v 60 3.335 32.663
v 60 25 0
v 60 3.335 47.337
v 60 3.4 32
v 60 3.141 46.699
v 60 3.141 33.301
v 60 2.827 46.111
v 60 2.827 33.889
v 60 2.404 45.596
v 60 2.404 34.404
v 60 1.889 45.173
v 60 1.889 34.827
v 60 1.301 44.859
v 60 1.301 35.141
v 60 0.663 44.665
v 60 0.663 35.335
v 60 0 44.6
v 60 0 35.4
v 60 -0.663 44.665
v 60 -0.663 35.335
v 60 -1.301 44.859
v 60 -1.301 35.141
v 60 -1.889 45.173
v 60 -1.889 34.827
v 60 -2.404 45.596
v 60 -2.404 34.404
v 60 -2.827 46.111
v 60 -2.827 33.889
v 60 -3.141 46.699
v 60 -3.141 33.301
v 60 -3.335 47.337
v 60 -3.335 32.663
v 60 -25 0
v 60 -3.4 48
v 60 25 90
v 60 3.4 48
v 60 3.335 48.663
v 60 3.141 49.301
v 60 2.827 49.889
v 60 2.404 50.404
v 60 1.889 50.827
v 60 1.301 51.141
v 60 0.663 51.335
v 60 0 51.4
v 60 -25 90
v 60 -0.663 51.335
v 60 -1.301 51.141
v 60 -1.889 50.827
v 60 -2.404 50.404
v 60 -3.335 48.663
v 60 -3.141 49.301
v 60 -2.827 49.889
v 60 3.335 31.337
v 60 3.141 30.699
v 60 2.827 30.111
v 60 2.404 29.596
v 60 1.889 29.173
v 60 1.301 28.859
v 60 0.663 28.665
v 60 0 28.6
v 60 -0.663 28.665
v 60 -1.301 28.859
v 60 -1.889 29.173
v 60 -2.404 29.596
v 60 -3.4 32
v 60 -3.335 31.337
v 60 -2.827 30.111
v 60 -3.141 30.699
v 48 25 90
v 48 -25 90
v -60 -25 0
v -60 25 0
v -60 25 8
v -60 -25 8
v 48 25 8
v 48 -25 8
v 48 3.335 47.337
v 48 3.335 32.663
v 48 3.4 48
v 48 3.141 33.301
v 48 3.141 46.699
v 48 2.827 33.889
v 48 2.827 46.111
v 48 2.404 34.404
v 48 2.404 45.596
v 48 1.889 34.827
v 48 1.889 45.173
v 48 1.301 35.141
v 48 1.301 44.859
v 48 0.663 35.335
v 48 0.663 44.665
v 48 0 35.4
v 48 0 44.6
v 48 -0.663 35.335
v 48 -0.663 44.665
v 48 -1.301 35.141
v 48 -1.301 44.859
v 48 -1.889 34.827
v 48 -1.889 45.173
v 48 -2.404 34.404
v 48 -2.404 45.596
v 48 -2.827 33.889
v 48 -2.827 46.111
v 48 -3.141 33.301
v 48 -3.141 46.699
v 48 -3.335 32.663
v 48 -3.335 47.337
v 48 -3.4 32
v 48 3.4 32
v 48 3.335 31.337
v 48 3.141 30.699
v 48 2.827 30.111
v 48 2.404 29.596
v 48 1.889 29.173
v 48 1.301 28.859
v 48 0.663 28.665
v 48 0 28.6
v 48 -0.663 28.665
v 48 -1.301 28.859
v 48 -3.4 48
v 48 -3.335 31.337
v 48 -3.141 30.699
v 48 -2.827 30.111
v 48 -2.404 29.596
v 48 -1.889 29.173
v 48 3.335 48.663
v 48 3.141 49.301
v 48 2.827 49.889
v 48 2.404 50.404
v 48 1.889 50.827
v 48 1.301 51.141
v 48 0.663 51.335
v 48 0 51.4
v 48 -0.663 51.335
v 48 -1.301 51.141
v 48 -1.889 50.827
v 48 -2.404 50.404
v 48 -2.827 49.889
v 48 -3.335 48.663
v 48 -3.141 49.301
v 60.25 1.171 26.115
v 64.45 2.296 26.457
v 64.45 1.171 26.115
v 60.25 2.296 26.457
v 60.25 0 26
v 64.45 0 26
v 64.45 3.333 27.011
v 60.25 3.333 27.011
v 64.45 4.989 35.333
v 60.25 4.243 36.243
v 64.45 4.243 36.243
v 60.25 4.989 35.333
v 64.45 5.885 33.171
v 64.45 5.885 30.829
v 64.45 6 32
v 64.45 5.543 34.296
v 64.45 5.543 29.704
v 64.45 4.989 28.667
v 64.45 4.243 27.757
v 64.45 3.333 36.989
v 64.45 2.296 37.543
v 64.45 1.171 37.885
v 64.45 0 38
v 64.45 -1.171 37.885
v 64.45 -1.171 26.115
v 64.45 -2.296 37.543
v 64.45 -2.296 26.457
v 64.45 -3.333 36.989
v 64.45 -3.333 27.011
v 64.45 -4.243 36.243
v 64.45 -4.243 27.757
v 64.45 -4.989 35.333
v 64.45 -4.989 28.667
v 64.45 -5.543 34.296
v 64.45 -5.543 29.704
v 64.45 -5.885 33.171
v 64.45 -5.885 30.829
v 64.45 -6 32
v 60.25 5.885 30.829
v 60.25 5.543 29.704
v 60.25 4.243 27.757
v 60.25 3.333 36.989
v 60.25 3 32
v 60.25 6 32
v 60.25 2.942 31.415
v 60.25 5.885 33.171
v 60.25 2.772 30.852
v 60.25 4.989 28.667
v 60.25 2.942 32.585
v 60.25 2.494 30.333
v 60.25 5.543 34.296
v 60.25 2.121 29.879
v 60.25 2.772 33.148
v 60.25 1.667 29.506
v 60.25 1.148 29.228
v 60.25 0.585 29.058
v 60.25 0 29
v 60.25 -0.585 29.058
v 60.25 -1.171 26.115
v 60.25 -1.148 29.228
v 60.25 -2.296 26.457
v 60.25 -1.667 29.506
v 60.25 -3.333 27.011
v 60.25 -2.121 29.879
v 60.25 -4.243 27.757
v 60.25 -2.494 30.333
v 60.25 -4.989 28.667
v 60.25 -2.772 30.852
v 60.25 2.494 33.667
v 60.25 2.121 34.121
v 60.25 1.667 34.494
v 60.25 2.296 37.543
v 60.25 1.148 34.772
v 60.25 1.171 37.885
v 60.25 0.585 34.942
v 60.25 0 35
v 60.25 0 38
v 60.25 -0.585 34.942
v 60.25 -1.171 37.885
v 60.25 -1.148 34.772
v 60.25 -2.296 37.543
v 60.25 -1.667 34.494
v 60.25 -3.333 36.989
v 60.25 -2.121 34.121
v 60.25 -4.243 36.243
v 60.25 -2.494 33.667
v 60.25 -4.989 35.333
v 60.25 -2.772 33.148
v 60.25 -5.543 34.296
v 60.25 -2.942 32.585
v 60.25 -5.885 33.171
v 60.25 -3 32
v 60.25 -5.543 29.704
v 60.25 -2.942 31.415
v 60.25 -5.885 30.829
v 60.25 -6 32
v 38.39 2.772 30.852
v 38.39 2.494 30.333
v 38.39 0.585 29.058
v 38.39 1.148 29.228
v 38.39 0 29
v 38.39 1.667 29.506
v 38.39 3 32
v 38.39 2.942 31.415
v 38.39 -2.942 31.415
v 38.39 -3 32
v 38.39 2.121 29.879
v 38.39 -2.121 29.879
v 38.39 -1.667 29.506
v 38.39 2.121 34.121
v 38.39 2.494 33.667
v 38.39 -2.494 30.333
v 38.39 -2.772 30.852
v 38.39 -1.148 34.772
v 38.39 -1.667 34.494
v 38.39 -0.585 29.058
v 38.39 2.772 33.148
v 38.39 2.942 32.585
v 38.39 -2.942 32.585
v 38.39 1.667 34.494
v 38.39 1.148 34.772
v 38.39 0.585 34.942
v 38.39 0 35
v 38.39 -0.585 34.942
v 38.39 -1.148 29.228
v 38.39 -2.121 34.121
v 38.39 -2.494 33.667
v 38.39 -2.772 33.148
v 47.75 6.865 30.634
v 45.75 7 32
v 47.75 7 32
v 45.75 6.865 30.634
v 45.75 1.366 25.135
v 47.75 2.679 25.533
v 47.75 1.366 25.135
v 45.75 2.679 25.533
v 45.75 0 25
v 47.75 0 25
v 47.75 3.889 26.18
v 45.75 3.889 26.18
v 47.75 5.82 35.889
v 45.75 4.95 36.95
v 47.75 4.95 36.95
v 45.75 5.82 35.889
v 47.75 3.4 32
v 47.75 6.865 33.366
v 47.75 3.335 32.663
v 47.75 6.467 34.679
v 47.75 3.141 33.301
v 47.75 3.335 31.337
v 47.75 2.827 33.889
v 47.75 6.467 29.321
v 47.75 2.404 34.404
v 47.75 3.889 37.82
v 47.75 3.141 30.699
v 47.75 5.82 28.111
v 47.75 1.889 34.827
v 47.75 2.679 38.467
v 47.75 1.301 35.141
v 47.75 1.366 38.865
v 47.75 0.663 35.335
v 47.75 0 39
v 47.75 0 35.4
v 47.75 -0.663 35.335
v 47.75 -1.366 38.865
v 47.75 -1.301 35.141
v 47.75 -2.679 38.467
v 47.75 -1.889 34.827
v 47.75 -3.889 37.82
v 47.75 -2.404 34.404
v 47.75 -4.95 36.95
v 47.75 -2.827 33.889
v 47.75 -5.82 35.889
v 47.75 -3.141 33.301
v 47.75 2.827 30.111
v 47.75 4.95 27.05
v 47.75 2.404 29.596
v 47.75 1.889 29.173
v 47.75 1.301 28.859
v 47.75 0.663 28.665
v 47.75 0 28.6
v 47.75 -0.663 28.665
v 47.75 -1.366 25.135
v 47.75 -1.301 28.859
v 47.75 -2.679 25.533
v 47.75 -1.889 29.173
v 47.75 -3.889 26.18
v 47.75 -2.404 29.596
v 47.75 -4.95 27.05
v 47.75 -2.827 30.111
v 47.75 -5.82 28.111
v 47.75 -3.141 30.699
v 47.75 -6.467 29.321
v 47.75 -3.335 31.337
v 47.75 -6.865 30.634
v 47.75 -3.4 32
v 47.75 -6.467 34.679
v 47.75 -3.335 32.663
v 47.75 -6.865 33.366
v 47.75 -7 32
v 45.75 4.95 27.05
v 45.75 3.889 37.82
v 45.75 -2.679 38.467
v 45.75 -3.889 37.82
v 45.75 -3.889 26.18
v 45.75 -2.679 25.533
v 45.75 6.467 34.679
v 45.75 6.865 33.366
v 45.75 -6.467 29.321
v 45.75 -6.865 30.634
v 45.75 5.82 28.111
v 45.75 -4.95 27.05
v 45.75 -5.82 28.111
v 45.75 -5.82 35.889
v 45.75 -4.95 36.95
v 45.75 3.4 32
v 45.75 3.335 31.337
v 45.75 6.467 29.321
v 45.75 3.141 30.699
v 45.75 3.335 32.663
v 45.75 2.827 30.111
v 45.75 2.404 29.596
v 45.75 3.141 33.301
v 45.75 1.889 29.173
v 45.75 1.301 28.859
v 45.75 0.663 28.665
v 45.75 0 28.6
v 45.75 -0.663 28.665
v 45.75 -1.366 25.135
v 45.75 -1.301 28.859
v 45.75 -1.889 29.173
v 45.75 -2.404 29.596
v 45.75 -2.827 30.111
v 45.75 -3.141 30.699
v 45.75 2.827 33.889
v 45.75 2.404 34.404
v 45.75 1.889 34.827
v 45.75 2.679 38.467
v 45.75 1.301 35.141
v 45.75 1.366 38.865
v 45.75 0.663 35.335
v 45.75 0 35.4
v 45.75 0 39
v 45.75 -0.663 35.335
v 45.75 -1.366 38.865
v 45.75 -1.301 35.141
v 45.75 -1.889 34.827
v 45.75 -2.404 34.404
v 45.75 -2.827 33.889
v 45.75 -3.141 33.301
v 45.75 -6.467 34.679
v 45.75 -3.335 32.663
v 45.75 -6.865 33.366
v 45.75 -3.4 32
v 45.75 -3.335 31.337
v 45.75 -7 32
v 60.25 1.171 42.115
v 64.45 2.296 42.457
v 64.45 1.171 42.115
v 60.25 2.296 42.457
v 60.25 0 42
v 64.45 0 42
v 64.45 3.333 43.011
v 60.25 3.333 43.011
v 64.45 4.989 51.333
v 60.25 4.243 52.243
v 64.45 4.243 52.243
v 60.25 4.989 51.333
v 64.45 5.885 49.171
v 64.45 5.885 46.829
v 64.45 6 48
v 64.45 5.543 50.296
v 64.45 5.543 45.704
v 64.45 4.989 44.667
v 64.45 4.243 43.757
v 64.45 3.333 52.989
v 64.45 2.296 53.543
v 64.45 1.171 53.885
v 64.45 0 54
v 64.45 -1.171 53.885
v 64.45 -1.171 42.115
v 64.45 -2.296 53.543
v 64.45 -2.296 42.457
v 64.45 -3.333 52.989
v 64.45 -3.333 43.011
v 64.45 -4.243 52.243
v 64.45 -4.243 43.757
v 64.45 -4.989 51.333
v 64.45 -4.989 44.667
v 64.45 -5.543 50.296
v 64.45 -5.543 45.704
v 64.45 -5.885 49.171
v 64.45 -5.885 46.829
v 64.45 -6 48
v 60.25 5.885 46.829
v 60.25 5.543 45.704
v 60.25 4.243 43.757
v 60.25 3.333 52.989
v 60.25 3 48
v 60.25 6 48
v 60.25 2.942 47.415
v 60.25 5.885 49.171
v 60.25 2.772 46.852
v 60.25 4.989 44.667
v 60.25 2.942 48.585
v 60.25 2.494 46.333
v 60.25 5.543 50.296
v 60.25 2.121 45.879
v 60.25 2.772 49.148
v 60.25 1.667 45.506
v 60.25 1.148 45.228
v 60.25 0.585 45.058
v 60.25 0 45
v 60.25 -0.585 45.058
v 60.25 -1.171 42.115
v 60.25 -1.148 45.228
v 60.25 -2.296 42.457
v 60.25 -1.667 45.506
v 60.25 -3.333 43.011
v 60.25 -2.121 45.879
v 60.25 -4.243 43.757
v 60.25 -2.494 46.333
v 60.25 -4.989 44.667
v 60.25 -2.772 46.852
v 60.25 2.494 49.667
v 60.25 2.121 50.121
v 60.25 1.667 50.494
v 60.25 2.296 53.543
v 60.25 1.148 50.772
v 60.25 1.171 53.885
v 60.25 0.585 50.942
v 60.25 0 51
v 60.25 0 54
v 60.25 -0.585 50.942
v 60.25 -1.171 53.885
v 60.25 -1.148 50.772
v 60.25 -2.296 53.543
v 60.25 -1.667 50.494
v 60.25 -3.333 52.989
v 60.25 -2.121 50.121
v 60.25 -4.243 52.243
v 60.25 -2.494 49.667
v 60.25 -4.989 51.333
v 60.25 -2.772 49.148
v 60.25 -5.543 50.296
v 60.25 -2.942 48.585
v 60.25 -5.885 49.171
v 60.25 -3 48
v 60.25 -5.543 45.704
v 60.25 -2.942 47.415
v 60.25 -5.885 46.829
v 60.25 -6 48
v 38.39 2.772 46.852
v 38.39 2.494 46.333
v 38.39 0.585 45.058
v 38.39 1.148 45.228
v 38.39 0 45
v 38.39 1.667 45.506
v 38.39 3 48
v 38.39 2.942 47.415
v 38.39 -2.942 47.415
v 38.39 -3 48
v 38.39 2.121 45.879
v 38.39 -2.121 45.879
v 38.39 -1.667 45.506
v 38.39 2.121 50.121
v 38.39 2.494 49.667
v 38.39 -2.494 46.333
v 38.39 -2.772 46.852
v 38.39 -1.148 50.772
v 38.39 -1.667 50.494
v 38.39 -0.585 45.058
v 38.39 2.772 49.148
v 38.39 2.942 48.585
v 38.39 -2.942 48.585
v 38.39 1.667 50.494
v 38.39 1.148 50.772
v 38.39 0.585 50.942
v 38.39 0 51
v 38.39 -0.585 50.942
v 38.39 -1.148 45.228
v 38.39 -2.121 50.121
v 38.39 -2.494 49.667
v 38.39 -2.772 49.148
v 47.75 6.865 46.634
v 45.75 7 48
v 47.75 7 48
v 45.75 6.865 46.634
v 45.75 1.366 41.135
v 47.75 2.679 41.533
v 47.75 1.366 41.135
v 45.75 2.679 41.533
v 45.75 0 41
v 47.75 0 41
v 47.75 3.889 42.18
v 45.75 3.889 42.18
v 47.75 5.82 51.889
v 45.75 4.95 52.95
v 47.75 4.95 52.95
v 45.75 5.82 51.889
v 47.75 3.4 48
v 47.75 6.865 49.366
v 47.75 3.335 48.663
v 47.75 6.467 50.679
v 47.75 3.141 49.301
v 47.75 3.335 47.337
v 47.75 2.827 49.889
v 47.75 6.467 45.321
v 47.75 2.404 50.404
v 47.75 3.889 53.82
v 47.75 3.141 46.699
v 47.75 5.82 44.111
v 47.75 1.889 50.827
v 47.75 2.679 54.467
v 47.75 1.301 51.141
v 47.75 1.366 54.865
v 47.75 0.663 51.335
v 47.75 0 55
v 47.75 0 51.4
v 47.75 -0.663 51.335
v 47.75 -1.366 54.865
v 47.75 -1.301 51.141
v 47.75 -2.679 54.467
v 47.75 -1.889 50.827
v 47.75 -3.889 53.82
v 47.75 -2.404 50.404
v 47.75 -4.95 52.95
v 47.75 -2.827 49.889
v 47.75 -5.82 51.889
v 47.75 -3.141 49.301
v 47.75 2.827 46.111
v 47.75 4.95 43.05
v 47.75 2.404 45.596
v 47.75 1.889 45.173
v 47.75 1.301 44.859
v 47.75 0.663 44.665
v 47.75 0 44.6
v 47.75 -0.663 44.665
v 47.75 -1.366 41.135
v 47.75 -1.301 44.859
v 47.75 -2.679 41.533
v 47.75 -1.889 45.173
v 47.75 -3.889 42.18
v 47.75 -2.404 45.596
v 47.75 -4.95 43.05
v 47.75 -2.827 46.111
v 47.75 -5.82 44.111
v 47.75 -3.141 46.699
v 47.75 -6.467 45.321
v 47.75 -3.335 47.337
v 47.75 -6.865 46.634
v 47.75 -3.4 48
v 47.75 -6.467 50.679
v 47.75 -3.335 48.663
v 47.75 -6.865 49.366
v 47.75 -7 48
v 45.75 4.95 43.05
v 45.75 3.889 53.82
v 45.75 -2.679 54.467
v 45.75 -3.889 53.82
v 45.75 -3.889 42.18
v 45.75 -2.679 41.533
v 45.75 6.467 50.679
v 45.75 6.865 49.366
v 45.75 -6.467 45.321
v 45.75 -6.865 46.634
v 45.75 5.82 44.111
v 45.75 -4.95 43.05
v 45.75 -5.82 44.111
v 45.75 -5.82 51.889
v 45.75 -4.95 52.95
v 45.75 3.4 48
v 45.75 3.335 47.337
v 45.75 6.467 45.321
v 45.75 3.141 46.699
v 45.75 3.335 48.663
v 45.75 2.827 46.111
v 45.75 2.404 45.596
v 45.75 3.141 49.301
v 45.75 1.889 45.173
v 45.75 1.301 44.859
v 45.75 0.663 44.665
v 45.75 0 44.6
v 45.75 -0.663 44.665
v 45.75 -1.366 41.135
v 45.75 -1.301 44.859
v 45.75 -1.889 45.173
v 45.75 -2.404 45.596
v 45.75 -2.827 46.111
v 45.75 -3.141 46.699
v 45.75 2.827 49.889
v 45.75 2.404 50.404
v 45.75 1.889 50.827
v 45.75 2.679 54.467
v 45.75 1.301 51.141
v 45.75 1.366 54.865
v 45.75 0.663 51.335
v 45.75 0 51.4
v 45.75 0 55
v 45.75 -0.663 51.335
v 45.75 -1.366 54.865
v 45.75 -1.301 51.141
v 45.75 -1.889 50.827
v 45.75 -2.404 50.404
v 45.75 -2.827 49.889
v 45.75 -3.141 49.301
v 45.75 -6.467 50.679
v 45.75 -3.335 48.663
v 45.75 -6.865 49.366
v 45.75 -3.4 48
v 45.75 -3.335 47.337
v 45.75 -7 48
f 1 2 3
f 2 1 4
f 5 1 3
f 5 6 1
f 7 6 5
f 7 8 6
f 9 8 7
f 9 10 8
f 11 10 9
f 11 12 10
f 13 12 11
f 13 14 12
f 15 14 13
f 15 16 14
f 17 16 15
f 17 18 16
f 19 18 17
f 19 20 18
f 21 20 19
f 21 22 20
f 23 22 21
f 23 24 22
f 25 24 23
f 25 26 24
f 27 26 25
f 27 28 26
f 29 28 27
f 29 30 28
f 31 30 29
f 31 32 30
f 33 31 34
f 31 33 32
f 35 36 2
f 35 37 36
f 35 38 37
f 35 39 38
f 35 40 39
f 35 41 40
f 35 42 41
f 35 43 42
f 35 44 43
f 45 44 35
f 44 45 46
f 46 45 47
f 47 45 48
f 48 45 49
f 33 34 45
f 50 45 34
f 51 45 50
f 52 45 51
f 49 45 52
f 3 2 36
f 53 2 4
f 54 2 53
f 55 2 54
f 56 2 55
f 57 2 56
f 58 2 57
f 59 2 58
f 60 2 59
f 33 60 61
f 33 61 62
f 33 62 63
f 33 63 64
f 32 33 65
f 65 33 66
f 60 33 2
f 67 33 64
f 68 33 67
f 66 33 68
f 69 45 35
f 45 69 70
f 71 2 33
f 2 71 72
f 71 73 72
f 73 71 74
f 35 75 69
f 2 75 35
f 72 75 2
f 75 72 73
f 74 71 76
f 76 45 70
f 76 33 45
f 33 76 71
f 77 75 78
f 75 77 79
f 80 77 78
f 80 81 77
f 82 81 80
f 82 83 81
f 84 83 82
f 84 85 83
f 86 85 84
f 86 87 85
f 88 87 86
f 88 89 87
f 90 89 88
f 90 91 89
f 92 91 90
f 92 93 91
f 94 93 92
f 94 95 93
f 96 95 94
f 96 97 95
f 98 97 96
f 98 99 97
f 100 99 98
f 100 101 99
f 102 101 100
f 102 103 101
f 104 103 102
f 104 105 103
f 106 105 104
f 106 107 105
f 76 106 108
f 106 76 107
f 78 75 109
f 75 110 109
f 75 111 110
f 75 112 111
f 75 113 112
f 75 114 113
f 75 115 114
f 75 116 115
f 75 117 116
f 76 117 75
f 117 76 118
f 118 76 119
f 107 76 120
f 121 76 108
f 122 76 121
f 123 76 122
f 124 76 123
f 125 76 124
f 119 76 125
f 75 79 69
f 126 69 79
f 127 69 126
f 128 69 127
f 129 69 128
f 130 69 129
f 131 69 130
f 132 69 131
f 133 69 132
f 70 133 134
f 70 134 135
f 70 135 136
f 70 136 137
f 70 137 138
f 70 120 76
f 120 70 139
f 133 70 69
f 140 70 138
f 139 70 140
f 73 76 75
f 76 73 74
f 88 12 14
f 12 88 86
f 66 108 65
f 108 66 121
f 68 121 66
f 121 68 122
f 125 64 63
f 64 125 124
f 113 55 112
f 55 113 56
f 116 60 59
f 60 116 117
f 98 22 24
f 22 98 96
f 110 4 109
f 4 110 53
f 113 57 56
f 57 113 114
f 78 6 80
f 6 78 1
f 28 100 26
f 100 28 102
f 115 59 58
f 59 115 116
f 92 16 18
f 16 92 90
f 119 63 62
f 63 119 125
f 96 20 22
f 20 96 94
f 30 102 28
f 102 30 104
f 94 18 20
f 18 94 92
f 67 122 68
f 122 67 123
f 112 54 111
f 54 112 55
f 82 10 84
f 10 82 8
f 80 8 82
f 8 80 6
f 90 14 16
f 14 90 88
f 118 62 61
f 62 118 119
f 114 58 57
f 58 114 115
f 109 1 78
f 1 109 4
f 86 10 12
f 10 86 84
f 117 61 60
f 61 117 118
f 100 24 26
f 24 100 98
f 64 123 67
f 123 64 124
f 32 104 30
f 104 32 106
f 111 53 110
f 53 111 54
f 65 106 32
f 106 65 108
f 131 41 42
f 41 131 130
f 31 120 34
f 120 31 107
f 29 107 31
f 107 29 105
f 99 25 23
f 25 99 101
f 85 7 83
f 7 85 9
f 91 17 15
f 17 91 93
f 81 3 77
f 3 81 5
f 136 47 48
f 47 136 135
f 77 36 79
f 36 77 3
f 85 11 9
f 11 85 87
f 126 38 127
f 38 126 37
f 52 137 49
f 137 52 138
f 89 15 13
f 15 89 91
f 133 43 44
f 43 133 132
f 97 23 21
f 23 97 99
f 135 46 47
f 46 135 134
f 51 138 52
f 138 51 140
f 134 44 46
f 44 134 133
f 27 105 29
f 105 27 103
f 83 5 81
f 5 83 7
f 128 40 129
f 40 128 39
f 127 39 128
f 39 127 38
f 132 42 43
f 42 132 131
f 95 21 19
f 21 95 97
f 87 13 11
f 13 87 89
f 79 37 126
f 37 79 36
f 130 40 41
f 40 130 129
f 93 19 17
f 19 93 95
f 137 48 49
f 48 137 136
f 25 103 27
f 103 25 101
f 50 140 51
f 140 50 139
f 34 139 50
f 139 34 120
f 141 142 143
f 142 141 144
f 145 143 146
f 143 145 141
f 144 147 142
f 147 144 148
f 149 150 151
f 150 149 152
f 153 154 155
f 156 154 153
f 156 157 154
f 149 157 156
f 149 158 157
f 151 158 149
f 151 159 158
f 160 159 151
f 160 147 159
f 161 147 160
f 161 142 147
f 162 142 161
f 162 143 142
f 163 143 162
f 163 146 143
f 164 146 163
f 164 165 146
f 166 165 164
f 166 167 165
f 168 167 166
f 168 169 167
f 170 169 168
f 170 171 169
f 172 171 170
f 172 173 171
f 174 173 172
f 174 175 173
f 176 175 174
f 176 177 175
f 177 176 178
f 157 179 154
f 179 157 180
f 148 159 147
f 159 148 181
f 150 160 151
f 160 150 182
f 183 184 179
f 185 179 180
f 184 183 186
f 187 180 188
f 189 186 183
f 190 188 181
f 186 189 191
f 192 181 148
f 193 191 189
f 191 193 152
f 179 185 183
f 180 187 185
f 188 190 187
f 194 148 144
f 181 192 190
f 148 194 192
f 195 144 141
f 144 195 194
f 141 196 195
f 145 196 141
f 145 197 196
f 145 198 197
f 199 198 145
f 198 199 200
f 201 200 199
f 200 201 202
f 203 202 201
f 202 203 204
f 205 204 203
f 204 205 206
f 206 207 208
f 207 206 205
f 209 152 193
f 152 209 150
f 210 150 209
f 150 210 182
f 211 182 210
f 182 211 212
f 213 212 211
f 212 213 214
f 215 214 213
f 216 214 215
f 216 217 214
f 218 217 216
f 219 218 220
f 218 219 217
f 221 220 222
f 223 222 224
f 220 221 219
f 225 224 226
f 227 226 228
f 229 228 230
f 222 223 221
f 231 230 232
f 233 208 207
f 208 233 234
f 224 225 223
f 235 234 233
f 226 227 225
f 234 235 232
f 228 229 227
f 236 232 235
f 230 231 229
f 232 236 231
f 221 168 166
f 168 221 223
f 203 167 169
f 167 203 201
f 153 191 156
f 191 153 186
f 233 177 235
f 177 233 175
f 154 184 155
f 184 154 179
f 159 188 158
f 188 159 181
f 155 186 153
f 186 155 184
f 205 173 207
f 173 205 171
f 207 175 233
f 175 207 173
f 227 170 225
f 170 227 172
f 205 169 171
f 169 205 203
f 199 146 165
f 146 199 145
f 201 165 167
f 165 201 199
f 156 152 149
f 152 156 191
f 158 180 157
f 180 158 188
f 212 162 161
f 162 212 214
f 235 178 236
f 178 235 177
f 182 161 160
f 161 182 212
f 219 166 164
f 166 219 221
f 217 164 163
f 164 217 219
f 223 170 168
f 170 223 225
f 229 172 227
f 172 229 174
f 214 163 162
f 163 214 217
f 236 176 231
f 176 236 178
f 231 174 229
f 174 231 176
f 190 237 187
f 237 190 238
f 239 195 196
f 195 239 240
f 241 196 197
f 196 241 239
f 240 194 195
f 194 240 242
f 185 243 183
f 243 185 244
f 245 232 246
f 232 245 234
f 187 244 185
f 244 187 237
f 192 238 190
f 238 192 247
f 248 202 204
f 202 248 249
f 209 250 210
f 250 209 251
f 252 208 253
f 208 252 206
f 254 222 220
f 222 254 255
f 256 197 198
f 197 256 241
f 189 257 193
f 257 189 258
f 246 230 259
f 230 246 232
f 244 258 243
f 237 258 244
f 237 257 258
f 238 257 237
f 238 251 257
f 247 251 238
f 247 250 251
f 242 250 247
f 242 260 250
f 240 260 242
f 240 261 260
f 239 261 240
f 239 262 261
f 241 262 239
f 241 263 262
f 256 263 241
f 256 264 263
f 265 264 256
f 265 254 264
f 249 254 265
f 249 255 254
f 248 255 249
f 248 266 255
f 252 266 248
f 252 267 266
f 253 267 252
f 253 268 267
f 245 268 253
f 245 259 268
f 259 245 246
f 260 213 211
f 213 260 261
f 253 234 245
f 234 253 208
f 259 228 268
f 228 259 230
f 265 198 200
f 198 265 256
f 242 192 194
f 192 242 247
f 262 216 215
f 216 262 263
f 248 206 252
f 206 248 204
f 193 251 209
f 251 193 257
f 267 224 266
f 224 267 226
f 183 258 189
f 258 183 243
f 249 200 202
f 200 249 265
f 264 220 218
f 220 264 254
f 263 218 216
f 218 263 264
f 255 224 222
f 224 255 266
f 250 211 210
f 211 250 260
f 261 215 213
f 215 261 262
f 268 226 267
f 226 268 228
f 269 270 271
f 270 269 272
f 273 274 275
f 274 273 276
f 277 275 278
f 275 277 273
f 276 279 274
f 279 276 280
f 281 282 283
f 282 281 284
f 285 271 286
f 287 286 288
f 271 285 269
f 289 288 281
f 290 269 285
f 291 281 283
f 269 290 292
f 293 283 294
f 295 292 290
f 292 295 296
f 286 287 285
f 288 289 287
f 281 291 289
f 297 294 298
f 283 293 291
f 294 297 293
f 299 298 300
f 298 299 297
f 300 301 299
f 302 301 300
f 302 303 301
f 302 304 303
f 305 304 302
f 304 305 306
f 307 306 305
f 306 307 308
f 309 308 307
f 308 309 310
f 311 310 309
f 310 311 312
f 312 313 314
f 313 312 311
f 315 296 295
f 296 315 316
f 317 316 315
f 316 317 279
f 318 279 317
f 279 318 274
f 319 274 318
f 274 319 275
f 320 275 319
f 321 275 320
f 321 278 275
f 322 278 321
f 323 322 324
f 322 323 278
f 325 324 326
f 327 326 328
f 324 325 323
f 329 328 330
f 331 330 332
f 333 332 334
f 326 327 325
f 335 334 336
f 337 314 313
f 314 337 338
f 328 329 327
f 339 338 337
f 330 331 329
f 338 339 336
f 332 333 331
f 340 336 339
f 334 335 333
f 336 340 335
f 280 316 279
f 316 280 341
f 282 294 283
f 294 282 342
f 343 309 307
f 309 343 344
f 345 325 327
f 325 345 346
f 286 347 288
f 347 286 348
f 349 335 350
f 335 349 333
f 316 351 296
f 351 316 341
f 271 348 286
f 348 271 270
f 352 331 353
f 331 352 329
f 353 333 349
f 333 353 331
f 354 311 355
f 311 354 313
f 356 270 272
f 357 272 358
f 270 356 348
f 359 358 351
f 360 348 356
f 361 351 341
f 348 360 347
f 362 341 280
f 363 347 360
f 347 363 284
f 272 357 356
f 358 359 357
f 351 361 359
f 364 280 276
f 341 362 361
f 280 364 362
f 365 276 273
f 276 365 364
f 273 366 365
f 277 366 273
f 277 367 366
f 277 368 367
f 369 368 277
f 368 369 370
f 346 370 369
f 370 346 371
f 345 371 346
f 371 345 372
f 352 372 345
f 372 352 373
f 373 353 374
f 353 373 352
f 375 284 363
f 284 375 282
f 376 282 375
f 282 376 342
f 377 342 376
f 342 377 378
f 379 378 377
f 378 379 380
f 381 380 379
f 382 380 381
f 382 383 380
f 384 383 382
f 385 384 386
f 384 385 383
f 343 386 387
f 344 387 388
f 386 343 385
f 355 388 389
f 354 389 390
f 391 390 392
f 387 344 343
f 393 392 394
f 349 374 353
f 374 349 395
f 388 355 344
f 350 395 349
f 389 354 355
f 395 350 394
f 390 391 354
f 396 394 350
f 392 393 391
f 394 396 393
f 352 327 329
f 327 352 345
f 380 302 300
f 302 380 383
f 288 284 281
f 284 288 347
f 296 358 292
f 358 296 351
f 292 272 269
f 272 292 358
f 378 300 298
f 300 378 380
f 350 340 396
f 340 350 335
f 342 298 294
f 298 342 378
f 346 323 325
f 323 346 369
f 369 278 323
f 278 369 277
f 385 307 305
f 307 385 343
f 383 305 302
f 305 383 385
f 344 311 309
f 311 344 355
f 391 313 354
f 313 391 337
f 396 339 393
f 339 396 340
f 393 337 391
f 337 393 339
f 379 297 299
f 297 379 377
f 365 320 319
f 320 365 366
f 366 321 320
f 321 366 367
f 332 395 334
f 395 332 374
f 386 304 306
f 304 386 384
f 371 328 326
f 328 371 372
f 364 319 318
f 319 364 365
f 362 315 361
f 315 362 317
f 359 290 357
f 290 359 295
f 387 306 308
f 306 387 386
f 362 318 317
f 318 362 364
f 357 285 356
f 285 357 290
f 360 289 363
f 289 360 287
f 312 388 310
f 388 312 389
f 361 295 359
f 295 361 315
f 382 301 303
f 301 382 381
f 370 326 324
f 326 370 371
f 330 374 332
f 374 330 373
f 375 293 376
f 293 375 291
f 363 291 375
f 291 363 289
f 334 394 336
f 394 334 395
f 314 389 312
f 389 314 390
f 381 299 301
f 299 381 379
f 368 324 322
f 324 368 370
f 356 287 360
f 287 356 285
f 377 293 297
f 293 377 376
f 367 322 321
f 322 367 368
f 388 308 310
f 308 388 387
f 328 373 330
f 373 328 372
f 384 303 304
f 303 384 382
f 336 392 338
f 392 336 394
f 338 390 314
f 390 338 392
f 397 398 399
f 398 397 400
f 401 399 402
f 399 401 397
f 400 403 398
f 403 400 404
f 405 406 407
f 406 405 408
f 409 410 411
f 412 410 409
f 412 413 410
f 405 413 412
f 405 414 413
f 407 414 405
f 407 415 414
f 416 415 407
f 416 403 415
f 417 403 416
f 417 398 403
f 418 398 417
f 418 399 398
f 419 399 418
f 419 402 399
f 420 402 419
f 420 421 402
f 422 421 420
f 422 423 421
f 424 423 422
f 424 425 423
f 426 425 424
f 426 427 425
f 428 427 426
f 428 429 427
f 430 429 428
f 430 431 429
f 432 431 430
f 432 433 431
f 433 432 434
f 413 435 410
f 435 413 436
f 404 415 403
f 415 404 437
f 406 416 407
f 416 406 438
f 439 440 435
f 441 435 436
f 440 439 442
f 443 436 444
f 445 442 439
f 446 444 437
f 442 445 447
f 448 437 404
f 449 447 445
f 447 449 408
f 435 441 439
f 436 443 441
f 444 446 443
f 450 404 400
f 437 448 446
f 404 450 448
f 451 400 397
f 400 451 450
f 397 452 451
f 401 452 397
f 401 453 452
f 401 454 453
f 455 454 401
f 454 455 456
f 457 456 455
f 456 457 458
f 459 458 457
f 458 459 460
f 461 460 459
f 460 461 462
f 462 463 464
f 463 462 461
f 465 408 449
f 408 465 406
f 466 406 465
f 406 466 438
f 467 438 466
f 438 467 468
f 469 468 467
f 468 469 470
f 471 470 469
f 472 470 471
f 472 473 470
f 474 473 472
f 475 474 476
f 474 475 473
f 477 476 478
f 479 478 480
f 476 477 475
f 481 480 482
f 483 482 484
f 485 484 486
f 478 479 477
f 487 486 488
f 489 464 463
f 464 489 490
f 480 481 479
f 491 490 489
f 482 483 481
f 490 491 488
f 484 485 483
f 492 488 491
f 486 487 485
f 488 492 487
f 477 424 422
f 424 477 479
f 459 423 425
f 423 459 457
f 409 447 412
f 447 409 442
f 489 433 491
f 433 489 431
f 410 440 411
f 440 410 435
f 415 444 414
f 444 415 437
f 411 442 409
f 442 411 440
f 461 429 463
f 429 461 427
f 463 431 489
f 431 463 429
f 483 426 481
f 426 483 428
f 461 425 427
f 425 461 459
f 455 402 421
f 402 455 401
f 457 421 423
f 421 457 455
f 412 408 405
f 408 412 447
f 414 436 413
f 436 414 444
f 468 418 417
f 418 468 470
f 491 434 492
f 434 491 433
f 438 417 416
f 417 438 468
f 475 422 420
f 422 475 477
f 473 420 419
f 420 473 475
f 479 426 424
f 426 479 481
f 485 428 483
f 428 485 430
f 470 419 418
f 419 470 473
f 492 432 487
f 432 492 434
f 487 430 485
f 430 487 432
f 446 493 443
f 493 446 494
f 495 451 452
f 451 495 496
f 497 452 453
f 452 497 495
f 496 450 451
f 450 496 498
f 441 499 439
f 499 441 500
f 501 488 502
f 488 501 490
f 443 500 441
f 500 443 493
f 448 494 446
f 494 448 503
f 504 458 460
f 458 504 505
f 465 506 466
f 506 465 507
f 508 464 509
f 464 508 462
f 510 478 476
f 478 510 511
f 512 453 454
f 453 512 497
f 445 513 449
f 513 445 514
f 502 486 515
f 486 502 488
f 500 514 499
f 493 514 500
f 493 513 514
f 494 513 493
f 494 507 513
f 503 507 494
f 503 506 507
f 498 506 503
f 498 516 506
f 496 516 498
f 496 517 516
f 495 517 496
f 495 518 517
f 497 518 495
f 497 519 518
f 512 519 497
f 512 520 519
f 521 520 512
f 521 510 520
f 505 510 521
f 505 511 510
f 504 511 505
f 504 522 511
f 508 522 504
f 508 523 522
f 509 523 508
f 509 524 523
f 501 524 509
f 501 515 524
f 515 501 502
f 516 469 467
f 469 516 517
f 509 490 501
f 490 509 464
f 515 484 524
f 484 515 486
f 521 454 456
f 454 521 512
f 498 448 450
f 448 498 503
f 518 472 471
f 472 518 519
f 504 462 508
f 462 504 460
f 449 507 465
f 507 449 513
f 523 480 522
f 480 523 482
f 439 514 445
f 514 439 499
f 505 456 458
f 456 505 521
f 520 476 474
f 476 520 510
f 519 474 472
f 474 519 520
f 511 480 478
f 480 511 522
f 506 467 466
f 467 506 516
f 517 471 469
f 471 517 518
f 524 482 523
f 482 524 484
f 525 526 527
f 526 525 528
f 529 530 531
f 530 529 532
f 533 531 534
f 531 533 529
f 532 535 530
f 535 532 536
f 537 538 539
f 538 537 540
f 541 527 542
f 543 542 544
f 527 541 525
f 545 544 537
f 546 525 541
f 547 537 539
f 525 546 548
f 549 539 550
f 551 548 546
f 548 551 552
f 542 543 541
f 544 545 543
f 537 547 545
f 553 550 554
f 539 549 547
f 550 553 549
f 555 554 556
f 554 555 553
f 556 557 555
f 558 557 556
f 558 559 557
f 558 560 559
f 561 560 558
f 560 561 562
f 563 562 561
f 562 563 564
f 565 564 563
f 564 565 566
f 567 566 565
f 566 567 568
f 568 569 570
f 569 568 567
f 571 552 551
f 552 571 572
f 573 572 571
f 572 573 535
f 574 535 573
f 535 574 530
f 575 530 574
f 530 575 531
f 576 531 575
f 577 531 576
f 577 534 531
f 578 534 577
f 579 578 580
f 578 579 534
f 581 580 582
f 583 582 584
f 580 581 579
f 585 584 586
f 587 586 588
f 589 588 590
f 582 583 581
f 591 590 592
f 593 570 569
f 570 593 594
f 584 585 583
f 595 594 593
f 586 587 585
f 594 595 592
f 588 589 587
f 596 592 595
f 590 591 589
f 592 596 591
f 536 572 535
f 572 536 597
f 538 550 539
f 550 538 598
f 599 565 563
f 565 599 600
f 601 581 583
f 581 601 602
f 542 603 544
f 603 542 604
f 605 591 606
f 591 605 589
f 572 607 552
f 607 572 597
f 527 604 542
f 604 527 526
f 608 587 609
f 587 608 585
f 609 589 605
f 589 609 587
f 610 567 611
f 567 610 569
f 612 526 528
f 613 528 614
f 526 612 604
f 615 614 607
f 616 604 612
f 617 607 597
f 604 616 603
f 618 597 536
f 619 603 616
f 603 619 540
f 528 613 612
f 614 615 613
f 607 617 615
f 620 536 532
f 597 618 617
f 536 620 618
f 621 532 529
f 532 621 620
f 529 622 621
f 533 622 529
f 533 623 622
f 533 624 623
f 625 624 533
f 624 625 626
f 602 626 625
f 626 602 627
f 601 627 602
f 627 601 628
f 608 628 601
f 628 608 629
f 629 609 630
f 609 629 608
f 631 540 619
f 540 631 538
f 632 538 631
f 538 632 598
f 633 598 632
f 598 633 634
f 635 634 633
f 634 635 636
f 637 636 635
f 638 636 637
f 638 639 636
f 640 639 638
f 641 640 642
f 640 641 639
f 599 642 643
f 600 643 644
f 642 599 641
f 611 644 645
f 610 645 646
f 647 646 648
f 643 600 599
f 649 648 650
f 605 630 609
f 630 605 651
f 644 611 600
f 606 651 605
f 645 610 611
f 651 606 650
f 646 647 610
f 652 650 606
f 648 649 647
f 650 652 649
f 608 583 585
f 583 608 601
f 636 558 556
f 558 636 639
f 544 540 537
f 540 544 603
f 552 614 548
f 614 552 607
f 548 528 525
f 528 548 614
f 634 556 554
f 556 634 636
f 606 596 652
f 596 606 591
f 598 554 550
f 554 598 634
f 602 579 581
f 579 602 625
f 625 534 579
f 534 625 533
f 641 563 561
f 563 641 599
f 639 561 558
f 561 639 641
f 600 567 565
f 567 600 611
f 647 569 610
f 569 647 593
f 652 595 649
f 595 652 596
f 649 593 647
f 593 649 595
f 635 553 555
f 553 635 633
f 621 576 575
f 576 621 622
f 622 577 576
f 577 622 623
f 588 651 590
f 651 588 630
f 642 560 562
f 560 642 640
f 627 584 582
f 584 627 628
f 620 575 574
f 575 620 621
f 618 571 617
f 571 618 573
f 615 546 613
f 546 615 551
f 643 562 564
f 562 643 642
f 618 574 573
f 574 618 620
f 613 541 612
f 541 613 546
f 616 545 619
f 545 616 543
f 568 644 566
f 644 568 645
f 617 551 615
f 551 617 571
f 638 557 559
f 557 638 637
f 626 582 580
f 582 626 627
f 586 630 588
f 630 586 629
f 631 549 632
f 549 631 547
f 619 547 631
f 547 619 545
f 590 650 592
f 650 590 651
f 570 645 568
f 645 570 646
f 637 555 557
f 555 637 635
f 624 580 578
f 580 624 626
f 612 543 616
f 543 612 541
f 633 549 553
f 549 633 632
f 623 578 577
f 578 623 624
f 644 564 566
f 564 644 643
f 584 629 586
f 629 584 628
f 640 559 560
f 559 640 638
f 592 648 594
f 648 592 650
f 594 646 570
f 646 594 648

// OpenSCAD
$fn = 32;

// ------------------------------------------------------------------------
// Bolted bracket: 120 x 50 mm bracket with 2 bolt joints
// Every part is its own module, assembly() places them once.
// ------------------------------------------------------------------------

// --- part 1 ---
module bracket() {
  difference() {
    translate([-60, -25, 0]) cube([120, 50, 90]);
    translate([-61, -26, 8]) cube([109, 52, 83]);
    translate([54, 0, 32]) rotate([0, 90, 0]) cylinder(h = 14, d = 6.8, center = true);
    translate([54, 0, 48]) rotate([0, 90, 0]) cylinder(h = 14, d = 6.8, center = true);
  }
}

// --- part 2 ---
module bolt1() {
  cylinder(h = 4.2, d = 12);
  translate([0, 0, -21.86]) cylinder(h = 21.86, d = 6);
}

// --- part 3 ---
module washer1() {
  difference() {
      translate([0, 0, 0]) cylinder(h = 2, d = 14);
      translate([0, 0, -1]) cylinder(h = 4, d = 6.8);
    }
}

// --- part 4 ---
module bolt2() {
  cylinder(h = 4.2, d = 12);
  translate([0, 0, -21.86]) cylinder(h = 21.86, d = 6);
}

// --- part 5 ---
module washer2() {
  difference() {
      translate([0, 0, 0]) cylinder(h = 2, d = 14);
      translate([0, 0, -1]) cylinder(h = 4, d = 6.8);
    }
}

// --- assembly ---
module assembly() {
  translate([0, 0, 0]) rotate([0, 0, 0]) bracket();
  translate([60.25, 0, 32]) rotate([0, 90, 0]) bolt1();
  translate([45.75, 0, 32]) rotate([0, 90, 0]) washer1();
  translate([60.25, 0, 48]) rotate([0, 90, 0]) bolt2();
  translate([45.75, 0, 48]) rotate([0, 90, 0]) washer2();
}

assembly();
